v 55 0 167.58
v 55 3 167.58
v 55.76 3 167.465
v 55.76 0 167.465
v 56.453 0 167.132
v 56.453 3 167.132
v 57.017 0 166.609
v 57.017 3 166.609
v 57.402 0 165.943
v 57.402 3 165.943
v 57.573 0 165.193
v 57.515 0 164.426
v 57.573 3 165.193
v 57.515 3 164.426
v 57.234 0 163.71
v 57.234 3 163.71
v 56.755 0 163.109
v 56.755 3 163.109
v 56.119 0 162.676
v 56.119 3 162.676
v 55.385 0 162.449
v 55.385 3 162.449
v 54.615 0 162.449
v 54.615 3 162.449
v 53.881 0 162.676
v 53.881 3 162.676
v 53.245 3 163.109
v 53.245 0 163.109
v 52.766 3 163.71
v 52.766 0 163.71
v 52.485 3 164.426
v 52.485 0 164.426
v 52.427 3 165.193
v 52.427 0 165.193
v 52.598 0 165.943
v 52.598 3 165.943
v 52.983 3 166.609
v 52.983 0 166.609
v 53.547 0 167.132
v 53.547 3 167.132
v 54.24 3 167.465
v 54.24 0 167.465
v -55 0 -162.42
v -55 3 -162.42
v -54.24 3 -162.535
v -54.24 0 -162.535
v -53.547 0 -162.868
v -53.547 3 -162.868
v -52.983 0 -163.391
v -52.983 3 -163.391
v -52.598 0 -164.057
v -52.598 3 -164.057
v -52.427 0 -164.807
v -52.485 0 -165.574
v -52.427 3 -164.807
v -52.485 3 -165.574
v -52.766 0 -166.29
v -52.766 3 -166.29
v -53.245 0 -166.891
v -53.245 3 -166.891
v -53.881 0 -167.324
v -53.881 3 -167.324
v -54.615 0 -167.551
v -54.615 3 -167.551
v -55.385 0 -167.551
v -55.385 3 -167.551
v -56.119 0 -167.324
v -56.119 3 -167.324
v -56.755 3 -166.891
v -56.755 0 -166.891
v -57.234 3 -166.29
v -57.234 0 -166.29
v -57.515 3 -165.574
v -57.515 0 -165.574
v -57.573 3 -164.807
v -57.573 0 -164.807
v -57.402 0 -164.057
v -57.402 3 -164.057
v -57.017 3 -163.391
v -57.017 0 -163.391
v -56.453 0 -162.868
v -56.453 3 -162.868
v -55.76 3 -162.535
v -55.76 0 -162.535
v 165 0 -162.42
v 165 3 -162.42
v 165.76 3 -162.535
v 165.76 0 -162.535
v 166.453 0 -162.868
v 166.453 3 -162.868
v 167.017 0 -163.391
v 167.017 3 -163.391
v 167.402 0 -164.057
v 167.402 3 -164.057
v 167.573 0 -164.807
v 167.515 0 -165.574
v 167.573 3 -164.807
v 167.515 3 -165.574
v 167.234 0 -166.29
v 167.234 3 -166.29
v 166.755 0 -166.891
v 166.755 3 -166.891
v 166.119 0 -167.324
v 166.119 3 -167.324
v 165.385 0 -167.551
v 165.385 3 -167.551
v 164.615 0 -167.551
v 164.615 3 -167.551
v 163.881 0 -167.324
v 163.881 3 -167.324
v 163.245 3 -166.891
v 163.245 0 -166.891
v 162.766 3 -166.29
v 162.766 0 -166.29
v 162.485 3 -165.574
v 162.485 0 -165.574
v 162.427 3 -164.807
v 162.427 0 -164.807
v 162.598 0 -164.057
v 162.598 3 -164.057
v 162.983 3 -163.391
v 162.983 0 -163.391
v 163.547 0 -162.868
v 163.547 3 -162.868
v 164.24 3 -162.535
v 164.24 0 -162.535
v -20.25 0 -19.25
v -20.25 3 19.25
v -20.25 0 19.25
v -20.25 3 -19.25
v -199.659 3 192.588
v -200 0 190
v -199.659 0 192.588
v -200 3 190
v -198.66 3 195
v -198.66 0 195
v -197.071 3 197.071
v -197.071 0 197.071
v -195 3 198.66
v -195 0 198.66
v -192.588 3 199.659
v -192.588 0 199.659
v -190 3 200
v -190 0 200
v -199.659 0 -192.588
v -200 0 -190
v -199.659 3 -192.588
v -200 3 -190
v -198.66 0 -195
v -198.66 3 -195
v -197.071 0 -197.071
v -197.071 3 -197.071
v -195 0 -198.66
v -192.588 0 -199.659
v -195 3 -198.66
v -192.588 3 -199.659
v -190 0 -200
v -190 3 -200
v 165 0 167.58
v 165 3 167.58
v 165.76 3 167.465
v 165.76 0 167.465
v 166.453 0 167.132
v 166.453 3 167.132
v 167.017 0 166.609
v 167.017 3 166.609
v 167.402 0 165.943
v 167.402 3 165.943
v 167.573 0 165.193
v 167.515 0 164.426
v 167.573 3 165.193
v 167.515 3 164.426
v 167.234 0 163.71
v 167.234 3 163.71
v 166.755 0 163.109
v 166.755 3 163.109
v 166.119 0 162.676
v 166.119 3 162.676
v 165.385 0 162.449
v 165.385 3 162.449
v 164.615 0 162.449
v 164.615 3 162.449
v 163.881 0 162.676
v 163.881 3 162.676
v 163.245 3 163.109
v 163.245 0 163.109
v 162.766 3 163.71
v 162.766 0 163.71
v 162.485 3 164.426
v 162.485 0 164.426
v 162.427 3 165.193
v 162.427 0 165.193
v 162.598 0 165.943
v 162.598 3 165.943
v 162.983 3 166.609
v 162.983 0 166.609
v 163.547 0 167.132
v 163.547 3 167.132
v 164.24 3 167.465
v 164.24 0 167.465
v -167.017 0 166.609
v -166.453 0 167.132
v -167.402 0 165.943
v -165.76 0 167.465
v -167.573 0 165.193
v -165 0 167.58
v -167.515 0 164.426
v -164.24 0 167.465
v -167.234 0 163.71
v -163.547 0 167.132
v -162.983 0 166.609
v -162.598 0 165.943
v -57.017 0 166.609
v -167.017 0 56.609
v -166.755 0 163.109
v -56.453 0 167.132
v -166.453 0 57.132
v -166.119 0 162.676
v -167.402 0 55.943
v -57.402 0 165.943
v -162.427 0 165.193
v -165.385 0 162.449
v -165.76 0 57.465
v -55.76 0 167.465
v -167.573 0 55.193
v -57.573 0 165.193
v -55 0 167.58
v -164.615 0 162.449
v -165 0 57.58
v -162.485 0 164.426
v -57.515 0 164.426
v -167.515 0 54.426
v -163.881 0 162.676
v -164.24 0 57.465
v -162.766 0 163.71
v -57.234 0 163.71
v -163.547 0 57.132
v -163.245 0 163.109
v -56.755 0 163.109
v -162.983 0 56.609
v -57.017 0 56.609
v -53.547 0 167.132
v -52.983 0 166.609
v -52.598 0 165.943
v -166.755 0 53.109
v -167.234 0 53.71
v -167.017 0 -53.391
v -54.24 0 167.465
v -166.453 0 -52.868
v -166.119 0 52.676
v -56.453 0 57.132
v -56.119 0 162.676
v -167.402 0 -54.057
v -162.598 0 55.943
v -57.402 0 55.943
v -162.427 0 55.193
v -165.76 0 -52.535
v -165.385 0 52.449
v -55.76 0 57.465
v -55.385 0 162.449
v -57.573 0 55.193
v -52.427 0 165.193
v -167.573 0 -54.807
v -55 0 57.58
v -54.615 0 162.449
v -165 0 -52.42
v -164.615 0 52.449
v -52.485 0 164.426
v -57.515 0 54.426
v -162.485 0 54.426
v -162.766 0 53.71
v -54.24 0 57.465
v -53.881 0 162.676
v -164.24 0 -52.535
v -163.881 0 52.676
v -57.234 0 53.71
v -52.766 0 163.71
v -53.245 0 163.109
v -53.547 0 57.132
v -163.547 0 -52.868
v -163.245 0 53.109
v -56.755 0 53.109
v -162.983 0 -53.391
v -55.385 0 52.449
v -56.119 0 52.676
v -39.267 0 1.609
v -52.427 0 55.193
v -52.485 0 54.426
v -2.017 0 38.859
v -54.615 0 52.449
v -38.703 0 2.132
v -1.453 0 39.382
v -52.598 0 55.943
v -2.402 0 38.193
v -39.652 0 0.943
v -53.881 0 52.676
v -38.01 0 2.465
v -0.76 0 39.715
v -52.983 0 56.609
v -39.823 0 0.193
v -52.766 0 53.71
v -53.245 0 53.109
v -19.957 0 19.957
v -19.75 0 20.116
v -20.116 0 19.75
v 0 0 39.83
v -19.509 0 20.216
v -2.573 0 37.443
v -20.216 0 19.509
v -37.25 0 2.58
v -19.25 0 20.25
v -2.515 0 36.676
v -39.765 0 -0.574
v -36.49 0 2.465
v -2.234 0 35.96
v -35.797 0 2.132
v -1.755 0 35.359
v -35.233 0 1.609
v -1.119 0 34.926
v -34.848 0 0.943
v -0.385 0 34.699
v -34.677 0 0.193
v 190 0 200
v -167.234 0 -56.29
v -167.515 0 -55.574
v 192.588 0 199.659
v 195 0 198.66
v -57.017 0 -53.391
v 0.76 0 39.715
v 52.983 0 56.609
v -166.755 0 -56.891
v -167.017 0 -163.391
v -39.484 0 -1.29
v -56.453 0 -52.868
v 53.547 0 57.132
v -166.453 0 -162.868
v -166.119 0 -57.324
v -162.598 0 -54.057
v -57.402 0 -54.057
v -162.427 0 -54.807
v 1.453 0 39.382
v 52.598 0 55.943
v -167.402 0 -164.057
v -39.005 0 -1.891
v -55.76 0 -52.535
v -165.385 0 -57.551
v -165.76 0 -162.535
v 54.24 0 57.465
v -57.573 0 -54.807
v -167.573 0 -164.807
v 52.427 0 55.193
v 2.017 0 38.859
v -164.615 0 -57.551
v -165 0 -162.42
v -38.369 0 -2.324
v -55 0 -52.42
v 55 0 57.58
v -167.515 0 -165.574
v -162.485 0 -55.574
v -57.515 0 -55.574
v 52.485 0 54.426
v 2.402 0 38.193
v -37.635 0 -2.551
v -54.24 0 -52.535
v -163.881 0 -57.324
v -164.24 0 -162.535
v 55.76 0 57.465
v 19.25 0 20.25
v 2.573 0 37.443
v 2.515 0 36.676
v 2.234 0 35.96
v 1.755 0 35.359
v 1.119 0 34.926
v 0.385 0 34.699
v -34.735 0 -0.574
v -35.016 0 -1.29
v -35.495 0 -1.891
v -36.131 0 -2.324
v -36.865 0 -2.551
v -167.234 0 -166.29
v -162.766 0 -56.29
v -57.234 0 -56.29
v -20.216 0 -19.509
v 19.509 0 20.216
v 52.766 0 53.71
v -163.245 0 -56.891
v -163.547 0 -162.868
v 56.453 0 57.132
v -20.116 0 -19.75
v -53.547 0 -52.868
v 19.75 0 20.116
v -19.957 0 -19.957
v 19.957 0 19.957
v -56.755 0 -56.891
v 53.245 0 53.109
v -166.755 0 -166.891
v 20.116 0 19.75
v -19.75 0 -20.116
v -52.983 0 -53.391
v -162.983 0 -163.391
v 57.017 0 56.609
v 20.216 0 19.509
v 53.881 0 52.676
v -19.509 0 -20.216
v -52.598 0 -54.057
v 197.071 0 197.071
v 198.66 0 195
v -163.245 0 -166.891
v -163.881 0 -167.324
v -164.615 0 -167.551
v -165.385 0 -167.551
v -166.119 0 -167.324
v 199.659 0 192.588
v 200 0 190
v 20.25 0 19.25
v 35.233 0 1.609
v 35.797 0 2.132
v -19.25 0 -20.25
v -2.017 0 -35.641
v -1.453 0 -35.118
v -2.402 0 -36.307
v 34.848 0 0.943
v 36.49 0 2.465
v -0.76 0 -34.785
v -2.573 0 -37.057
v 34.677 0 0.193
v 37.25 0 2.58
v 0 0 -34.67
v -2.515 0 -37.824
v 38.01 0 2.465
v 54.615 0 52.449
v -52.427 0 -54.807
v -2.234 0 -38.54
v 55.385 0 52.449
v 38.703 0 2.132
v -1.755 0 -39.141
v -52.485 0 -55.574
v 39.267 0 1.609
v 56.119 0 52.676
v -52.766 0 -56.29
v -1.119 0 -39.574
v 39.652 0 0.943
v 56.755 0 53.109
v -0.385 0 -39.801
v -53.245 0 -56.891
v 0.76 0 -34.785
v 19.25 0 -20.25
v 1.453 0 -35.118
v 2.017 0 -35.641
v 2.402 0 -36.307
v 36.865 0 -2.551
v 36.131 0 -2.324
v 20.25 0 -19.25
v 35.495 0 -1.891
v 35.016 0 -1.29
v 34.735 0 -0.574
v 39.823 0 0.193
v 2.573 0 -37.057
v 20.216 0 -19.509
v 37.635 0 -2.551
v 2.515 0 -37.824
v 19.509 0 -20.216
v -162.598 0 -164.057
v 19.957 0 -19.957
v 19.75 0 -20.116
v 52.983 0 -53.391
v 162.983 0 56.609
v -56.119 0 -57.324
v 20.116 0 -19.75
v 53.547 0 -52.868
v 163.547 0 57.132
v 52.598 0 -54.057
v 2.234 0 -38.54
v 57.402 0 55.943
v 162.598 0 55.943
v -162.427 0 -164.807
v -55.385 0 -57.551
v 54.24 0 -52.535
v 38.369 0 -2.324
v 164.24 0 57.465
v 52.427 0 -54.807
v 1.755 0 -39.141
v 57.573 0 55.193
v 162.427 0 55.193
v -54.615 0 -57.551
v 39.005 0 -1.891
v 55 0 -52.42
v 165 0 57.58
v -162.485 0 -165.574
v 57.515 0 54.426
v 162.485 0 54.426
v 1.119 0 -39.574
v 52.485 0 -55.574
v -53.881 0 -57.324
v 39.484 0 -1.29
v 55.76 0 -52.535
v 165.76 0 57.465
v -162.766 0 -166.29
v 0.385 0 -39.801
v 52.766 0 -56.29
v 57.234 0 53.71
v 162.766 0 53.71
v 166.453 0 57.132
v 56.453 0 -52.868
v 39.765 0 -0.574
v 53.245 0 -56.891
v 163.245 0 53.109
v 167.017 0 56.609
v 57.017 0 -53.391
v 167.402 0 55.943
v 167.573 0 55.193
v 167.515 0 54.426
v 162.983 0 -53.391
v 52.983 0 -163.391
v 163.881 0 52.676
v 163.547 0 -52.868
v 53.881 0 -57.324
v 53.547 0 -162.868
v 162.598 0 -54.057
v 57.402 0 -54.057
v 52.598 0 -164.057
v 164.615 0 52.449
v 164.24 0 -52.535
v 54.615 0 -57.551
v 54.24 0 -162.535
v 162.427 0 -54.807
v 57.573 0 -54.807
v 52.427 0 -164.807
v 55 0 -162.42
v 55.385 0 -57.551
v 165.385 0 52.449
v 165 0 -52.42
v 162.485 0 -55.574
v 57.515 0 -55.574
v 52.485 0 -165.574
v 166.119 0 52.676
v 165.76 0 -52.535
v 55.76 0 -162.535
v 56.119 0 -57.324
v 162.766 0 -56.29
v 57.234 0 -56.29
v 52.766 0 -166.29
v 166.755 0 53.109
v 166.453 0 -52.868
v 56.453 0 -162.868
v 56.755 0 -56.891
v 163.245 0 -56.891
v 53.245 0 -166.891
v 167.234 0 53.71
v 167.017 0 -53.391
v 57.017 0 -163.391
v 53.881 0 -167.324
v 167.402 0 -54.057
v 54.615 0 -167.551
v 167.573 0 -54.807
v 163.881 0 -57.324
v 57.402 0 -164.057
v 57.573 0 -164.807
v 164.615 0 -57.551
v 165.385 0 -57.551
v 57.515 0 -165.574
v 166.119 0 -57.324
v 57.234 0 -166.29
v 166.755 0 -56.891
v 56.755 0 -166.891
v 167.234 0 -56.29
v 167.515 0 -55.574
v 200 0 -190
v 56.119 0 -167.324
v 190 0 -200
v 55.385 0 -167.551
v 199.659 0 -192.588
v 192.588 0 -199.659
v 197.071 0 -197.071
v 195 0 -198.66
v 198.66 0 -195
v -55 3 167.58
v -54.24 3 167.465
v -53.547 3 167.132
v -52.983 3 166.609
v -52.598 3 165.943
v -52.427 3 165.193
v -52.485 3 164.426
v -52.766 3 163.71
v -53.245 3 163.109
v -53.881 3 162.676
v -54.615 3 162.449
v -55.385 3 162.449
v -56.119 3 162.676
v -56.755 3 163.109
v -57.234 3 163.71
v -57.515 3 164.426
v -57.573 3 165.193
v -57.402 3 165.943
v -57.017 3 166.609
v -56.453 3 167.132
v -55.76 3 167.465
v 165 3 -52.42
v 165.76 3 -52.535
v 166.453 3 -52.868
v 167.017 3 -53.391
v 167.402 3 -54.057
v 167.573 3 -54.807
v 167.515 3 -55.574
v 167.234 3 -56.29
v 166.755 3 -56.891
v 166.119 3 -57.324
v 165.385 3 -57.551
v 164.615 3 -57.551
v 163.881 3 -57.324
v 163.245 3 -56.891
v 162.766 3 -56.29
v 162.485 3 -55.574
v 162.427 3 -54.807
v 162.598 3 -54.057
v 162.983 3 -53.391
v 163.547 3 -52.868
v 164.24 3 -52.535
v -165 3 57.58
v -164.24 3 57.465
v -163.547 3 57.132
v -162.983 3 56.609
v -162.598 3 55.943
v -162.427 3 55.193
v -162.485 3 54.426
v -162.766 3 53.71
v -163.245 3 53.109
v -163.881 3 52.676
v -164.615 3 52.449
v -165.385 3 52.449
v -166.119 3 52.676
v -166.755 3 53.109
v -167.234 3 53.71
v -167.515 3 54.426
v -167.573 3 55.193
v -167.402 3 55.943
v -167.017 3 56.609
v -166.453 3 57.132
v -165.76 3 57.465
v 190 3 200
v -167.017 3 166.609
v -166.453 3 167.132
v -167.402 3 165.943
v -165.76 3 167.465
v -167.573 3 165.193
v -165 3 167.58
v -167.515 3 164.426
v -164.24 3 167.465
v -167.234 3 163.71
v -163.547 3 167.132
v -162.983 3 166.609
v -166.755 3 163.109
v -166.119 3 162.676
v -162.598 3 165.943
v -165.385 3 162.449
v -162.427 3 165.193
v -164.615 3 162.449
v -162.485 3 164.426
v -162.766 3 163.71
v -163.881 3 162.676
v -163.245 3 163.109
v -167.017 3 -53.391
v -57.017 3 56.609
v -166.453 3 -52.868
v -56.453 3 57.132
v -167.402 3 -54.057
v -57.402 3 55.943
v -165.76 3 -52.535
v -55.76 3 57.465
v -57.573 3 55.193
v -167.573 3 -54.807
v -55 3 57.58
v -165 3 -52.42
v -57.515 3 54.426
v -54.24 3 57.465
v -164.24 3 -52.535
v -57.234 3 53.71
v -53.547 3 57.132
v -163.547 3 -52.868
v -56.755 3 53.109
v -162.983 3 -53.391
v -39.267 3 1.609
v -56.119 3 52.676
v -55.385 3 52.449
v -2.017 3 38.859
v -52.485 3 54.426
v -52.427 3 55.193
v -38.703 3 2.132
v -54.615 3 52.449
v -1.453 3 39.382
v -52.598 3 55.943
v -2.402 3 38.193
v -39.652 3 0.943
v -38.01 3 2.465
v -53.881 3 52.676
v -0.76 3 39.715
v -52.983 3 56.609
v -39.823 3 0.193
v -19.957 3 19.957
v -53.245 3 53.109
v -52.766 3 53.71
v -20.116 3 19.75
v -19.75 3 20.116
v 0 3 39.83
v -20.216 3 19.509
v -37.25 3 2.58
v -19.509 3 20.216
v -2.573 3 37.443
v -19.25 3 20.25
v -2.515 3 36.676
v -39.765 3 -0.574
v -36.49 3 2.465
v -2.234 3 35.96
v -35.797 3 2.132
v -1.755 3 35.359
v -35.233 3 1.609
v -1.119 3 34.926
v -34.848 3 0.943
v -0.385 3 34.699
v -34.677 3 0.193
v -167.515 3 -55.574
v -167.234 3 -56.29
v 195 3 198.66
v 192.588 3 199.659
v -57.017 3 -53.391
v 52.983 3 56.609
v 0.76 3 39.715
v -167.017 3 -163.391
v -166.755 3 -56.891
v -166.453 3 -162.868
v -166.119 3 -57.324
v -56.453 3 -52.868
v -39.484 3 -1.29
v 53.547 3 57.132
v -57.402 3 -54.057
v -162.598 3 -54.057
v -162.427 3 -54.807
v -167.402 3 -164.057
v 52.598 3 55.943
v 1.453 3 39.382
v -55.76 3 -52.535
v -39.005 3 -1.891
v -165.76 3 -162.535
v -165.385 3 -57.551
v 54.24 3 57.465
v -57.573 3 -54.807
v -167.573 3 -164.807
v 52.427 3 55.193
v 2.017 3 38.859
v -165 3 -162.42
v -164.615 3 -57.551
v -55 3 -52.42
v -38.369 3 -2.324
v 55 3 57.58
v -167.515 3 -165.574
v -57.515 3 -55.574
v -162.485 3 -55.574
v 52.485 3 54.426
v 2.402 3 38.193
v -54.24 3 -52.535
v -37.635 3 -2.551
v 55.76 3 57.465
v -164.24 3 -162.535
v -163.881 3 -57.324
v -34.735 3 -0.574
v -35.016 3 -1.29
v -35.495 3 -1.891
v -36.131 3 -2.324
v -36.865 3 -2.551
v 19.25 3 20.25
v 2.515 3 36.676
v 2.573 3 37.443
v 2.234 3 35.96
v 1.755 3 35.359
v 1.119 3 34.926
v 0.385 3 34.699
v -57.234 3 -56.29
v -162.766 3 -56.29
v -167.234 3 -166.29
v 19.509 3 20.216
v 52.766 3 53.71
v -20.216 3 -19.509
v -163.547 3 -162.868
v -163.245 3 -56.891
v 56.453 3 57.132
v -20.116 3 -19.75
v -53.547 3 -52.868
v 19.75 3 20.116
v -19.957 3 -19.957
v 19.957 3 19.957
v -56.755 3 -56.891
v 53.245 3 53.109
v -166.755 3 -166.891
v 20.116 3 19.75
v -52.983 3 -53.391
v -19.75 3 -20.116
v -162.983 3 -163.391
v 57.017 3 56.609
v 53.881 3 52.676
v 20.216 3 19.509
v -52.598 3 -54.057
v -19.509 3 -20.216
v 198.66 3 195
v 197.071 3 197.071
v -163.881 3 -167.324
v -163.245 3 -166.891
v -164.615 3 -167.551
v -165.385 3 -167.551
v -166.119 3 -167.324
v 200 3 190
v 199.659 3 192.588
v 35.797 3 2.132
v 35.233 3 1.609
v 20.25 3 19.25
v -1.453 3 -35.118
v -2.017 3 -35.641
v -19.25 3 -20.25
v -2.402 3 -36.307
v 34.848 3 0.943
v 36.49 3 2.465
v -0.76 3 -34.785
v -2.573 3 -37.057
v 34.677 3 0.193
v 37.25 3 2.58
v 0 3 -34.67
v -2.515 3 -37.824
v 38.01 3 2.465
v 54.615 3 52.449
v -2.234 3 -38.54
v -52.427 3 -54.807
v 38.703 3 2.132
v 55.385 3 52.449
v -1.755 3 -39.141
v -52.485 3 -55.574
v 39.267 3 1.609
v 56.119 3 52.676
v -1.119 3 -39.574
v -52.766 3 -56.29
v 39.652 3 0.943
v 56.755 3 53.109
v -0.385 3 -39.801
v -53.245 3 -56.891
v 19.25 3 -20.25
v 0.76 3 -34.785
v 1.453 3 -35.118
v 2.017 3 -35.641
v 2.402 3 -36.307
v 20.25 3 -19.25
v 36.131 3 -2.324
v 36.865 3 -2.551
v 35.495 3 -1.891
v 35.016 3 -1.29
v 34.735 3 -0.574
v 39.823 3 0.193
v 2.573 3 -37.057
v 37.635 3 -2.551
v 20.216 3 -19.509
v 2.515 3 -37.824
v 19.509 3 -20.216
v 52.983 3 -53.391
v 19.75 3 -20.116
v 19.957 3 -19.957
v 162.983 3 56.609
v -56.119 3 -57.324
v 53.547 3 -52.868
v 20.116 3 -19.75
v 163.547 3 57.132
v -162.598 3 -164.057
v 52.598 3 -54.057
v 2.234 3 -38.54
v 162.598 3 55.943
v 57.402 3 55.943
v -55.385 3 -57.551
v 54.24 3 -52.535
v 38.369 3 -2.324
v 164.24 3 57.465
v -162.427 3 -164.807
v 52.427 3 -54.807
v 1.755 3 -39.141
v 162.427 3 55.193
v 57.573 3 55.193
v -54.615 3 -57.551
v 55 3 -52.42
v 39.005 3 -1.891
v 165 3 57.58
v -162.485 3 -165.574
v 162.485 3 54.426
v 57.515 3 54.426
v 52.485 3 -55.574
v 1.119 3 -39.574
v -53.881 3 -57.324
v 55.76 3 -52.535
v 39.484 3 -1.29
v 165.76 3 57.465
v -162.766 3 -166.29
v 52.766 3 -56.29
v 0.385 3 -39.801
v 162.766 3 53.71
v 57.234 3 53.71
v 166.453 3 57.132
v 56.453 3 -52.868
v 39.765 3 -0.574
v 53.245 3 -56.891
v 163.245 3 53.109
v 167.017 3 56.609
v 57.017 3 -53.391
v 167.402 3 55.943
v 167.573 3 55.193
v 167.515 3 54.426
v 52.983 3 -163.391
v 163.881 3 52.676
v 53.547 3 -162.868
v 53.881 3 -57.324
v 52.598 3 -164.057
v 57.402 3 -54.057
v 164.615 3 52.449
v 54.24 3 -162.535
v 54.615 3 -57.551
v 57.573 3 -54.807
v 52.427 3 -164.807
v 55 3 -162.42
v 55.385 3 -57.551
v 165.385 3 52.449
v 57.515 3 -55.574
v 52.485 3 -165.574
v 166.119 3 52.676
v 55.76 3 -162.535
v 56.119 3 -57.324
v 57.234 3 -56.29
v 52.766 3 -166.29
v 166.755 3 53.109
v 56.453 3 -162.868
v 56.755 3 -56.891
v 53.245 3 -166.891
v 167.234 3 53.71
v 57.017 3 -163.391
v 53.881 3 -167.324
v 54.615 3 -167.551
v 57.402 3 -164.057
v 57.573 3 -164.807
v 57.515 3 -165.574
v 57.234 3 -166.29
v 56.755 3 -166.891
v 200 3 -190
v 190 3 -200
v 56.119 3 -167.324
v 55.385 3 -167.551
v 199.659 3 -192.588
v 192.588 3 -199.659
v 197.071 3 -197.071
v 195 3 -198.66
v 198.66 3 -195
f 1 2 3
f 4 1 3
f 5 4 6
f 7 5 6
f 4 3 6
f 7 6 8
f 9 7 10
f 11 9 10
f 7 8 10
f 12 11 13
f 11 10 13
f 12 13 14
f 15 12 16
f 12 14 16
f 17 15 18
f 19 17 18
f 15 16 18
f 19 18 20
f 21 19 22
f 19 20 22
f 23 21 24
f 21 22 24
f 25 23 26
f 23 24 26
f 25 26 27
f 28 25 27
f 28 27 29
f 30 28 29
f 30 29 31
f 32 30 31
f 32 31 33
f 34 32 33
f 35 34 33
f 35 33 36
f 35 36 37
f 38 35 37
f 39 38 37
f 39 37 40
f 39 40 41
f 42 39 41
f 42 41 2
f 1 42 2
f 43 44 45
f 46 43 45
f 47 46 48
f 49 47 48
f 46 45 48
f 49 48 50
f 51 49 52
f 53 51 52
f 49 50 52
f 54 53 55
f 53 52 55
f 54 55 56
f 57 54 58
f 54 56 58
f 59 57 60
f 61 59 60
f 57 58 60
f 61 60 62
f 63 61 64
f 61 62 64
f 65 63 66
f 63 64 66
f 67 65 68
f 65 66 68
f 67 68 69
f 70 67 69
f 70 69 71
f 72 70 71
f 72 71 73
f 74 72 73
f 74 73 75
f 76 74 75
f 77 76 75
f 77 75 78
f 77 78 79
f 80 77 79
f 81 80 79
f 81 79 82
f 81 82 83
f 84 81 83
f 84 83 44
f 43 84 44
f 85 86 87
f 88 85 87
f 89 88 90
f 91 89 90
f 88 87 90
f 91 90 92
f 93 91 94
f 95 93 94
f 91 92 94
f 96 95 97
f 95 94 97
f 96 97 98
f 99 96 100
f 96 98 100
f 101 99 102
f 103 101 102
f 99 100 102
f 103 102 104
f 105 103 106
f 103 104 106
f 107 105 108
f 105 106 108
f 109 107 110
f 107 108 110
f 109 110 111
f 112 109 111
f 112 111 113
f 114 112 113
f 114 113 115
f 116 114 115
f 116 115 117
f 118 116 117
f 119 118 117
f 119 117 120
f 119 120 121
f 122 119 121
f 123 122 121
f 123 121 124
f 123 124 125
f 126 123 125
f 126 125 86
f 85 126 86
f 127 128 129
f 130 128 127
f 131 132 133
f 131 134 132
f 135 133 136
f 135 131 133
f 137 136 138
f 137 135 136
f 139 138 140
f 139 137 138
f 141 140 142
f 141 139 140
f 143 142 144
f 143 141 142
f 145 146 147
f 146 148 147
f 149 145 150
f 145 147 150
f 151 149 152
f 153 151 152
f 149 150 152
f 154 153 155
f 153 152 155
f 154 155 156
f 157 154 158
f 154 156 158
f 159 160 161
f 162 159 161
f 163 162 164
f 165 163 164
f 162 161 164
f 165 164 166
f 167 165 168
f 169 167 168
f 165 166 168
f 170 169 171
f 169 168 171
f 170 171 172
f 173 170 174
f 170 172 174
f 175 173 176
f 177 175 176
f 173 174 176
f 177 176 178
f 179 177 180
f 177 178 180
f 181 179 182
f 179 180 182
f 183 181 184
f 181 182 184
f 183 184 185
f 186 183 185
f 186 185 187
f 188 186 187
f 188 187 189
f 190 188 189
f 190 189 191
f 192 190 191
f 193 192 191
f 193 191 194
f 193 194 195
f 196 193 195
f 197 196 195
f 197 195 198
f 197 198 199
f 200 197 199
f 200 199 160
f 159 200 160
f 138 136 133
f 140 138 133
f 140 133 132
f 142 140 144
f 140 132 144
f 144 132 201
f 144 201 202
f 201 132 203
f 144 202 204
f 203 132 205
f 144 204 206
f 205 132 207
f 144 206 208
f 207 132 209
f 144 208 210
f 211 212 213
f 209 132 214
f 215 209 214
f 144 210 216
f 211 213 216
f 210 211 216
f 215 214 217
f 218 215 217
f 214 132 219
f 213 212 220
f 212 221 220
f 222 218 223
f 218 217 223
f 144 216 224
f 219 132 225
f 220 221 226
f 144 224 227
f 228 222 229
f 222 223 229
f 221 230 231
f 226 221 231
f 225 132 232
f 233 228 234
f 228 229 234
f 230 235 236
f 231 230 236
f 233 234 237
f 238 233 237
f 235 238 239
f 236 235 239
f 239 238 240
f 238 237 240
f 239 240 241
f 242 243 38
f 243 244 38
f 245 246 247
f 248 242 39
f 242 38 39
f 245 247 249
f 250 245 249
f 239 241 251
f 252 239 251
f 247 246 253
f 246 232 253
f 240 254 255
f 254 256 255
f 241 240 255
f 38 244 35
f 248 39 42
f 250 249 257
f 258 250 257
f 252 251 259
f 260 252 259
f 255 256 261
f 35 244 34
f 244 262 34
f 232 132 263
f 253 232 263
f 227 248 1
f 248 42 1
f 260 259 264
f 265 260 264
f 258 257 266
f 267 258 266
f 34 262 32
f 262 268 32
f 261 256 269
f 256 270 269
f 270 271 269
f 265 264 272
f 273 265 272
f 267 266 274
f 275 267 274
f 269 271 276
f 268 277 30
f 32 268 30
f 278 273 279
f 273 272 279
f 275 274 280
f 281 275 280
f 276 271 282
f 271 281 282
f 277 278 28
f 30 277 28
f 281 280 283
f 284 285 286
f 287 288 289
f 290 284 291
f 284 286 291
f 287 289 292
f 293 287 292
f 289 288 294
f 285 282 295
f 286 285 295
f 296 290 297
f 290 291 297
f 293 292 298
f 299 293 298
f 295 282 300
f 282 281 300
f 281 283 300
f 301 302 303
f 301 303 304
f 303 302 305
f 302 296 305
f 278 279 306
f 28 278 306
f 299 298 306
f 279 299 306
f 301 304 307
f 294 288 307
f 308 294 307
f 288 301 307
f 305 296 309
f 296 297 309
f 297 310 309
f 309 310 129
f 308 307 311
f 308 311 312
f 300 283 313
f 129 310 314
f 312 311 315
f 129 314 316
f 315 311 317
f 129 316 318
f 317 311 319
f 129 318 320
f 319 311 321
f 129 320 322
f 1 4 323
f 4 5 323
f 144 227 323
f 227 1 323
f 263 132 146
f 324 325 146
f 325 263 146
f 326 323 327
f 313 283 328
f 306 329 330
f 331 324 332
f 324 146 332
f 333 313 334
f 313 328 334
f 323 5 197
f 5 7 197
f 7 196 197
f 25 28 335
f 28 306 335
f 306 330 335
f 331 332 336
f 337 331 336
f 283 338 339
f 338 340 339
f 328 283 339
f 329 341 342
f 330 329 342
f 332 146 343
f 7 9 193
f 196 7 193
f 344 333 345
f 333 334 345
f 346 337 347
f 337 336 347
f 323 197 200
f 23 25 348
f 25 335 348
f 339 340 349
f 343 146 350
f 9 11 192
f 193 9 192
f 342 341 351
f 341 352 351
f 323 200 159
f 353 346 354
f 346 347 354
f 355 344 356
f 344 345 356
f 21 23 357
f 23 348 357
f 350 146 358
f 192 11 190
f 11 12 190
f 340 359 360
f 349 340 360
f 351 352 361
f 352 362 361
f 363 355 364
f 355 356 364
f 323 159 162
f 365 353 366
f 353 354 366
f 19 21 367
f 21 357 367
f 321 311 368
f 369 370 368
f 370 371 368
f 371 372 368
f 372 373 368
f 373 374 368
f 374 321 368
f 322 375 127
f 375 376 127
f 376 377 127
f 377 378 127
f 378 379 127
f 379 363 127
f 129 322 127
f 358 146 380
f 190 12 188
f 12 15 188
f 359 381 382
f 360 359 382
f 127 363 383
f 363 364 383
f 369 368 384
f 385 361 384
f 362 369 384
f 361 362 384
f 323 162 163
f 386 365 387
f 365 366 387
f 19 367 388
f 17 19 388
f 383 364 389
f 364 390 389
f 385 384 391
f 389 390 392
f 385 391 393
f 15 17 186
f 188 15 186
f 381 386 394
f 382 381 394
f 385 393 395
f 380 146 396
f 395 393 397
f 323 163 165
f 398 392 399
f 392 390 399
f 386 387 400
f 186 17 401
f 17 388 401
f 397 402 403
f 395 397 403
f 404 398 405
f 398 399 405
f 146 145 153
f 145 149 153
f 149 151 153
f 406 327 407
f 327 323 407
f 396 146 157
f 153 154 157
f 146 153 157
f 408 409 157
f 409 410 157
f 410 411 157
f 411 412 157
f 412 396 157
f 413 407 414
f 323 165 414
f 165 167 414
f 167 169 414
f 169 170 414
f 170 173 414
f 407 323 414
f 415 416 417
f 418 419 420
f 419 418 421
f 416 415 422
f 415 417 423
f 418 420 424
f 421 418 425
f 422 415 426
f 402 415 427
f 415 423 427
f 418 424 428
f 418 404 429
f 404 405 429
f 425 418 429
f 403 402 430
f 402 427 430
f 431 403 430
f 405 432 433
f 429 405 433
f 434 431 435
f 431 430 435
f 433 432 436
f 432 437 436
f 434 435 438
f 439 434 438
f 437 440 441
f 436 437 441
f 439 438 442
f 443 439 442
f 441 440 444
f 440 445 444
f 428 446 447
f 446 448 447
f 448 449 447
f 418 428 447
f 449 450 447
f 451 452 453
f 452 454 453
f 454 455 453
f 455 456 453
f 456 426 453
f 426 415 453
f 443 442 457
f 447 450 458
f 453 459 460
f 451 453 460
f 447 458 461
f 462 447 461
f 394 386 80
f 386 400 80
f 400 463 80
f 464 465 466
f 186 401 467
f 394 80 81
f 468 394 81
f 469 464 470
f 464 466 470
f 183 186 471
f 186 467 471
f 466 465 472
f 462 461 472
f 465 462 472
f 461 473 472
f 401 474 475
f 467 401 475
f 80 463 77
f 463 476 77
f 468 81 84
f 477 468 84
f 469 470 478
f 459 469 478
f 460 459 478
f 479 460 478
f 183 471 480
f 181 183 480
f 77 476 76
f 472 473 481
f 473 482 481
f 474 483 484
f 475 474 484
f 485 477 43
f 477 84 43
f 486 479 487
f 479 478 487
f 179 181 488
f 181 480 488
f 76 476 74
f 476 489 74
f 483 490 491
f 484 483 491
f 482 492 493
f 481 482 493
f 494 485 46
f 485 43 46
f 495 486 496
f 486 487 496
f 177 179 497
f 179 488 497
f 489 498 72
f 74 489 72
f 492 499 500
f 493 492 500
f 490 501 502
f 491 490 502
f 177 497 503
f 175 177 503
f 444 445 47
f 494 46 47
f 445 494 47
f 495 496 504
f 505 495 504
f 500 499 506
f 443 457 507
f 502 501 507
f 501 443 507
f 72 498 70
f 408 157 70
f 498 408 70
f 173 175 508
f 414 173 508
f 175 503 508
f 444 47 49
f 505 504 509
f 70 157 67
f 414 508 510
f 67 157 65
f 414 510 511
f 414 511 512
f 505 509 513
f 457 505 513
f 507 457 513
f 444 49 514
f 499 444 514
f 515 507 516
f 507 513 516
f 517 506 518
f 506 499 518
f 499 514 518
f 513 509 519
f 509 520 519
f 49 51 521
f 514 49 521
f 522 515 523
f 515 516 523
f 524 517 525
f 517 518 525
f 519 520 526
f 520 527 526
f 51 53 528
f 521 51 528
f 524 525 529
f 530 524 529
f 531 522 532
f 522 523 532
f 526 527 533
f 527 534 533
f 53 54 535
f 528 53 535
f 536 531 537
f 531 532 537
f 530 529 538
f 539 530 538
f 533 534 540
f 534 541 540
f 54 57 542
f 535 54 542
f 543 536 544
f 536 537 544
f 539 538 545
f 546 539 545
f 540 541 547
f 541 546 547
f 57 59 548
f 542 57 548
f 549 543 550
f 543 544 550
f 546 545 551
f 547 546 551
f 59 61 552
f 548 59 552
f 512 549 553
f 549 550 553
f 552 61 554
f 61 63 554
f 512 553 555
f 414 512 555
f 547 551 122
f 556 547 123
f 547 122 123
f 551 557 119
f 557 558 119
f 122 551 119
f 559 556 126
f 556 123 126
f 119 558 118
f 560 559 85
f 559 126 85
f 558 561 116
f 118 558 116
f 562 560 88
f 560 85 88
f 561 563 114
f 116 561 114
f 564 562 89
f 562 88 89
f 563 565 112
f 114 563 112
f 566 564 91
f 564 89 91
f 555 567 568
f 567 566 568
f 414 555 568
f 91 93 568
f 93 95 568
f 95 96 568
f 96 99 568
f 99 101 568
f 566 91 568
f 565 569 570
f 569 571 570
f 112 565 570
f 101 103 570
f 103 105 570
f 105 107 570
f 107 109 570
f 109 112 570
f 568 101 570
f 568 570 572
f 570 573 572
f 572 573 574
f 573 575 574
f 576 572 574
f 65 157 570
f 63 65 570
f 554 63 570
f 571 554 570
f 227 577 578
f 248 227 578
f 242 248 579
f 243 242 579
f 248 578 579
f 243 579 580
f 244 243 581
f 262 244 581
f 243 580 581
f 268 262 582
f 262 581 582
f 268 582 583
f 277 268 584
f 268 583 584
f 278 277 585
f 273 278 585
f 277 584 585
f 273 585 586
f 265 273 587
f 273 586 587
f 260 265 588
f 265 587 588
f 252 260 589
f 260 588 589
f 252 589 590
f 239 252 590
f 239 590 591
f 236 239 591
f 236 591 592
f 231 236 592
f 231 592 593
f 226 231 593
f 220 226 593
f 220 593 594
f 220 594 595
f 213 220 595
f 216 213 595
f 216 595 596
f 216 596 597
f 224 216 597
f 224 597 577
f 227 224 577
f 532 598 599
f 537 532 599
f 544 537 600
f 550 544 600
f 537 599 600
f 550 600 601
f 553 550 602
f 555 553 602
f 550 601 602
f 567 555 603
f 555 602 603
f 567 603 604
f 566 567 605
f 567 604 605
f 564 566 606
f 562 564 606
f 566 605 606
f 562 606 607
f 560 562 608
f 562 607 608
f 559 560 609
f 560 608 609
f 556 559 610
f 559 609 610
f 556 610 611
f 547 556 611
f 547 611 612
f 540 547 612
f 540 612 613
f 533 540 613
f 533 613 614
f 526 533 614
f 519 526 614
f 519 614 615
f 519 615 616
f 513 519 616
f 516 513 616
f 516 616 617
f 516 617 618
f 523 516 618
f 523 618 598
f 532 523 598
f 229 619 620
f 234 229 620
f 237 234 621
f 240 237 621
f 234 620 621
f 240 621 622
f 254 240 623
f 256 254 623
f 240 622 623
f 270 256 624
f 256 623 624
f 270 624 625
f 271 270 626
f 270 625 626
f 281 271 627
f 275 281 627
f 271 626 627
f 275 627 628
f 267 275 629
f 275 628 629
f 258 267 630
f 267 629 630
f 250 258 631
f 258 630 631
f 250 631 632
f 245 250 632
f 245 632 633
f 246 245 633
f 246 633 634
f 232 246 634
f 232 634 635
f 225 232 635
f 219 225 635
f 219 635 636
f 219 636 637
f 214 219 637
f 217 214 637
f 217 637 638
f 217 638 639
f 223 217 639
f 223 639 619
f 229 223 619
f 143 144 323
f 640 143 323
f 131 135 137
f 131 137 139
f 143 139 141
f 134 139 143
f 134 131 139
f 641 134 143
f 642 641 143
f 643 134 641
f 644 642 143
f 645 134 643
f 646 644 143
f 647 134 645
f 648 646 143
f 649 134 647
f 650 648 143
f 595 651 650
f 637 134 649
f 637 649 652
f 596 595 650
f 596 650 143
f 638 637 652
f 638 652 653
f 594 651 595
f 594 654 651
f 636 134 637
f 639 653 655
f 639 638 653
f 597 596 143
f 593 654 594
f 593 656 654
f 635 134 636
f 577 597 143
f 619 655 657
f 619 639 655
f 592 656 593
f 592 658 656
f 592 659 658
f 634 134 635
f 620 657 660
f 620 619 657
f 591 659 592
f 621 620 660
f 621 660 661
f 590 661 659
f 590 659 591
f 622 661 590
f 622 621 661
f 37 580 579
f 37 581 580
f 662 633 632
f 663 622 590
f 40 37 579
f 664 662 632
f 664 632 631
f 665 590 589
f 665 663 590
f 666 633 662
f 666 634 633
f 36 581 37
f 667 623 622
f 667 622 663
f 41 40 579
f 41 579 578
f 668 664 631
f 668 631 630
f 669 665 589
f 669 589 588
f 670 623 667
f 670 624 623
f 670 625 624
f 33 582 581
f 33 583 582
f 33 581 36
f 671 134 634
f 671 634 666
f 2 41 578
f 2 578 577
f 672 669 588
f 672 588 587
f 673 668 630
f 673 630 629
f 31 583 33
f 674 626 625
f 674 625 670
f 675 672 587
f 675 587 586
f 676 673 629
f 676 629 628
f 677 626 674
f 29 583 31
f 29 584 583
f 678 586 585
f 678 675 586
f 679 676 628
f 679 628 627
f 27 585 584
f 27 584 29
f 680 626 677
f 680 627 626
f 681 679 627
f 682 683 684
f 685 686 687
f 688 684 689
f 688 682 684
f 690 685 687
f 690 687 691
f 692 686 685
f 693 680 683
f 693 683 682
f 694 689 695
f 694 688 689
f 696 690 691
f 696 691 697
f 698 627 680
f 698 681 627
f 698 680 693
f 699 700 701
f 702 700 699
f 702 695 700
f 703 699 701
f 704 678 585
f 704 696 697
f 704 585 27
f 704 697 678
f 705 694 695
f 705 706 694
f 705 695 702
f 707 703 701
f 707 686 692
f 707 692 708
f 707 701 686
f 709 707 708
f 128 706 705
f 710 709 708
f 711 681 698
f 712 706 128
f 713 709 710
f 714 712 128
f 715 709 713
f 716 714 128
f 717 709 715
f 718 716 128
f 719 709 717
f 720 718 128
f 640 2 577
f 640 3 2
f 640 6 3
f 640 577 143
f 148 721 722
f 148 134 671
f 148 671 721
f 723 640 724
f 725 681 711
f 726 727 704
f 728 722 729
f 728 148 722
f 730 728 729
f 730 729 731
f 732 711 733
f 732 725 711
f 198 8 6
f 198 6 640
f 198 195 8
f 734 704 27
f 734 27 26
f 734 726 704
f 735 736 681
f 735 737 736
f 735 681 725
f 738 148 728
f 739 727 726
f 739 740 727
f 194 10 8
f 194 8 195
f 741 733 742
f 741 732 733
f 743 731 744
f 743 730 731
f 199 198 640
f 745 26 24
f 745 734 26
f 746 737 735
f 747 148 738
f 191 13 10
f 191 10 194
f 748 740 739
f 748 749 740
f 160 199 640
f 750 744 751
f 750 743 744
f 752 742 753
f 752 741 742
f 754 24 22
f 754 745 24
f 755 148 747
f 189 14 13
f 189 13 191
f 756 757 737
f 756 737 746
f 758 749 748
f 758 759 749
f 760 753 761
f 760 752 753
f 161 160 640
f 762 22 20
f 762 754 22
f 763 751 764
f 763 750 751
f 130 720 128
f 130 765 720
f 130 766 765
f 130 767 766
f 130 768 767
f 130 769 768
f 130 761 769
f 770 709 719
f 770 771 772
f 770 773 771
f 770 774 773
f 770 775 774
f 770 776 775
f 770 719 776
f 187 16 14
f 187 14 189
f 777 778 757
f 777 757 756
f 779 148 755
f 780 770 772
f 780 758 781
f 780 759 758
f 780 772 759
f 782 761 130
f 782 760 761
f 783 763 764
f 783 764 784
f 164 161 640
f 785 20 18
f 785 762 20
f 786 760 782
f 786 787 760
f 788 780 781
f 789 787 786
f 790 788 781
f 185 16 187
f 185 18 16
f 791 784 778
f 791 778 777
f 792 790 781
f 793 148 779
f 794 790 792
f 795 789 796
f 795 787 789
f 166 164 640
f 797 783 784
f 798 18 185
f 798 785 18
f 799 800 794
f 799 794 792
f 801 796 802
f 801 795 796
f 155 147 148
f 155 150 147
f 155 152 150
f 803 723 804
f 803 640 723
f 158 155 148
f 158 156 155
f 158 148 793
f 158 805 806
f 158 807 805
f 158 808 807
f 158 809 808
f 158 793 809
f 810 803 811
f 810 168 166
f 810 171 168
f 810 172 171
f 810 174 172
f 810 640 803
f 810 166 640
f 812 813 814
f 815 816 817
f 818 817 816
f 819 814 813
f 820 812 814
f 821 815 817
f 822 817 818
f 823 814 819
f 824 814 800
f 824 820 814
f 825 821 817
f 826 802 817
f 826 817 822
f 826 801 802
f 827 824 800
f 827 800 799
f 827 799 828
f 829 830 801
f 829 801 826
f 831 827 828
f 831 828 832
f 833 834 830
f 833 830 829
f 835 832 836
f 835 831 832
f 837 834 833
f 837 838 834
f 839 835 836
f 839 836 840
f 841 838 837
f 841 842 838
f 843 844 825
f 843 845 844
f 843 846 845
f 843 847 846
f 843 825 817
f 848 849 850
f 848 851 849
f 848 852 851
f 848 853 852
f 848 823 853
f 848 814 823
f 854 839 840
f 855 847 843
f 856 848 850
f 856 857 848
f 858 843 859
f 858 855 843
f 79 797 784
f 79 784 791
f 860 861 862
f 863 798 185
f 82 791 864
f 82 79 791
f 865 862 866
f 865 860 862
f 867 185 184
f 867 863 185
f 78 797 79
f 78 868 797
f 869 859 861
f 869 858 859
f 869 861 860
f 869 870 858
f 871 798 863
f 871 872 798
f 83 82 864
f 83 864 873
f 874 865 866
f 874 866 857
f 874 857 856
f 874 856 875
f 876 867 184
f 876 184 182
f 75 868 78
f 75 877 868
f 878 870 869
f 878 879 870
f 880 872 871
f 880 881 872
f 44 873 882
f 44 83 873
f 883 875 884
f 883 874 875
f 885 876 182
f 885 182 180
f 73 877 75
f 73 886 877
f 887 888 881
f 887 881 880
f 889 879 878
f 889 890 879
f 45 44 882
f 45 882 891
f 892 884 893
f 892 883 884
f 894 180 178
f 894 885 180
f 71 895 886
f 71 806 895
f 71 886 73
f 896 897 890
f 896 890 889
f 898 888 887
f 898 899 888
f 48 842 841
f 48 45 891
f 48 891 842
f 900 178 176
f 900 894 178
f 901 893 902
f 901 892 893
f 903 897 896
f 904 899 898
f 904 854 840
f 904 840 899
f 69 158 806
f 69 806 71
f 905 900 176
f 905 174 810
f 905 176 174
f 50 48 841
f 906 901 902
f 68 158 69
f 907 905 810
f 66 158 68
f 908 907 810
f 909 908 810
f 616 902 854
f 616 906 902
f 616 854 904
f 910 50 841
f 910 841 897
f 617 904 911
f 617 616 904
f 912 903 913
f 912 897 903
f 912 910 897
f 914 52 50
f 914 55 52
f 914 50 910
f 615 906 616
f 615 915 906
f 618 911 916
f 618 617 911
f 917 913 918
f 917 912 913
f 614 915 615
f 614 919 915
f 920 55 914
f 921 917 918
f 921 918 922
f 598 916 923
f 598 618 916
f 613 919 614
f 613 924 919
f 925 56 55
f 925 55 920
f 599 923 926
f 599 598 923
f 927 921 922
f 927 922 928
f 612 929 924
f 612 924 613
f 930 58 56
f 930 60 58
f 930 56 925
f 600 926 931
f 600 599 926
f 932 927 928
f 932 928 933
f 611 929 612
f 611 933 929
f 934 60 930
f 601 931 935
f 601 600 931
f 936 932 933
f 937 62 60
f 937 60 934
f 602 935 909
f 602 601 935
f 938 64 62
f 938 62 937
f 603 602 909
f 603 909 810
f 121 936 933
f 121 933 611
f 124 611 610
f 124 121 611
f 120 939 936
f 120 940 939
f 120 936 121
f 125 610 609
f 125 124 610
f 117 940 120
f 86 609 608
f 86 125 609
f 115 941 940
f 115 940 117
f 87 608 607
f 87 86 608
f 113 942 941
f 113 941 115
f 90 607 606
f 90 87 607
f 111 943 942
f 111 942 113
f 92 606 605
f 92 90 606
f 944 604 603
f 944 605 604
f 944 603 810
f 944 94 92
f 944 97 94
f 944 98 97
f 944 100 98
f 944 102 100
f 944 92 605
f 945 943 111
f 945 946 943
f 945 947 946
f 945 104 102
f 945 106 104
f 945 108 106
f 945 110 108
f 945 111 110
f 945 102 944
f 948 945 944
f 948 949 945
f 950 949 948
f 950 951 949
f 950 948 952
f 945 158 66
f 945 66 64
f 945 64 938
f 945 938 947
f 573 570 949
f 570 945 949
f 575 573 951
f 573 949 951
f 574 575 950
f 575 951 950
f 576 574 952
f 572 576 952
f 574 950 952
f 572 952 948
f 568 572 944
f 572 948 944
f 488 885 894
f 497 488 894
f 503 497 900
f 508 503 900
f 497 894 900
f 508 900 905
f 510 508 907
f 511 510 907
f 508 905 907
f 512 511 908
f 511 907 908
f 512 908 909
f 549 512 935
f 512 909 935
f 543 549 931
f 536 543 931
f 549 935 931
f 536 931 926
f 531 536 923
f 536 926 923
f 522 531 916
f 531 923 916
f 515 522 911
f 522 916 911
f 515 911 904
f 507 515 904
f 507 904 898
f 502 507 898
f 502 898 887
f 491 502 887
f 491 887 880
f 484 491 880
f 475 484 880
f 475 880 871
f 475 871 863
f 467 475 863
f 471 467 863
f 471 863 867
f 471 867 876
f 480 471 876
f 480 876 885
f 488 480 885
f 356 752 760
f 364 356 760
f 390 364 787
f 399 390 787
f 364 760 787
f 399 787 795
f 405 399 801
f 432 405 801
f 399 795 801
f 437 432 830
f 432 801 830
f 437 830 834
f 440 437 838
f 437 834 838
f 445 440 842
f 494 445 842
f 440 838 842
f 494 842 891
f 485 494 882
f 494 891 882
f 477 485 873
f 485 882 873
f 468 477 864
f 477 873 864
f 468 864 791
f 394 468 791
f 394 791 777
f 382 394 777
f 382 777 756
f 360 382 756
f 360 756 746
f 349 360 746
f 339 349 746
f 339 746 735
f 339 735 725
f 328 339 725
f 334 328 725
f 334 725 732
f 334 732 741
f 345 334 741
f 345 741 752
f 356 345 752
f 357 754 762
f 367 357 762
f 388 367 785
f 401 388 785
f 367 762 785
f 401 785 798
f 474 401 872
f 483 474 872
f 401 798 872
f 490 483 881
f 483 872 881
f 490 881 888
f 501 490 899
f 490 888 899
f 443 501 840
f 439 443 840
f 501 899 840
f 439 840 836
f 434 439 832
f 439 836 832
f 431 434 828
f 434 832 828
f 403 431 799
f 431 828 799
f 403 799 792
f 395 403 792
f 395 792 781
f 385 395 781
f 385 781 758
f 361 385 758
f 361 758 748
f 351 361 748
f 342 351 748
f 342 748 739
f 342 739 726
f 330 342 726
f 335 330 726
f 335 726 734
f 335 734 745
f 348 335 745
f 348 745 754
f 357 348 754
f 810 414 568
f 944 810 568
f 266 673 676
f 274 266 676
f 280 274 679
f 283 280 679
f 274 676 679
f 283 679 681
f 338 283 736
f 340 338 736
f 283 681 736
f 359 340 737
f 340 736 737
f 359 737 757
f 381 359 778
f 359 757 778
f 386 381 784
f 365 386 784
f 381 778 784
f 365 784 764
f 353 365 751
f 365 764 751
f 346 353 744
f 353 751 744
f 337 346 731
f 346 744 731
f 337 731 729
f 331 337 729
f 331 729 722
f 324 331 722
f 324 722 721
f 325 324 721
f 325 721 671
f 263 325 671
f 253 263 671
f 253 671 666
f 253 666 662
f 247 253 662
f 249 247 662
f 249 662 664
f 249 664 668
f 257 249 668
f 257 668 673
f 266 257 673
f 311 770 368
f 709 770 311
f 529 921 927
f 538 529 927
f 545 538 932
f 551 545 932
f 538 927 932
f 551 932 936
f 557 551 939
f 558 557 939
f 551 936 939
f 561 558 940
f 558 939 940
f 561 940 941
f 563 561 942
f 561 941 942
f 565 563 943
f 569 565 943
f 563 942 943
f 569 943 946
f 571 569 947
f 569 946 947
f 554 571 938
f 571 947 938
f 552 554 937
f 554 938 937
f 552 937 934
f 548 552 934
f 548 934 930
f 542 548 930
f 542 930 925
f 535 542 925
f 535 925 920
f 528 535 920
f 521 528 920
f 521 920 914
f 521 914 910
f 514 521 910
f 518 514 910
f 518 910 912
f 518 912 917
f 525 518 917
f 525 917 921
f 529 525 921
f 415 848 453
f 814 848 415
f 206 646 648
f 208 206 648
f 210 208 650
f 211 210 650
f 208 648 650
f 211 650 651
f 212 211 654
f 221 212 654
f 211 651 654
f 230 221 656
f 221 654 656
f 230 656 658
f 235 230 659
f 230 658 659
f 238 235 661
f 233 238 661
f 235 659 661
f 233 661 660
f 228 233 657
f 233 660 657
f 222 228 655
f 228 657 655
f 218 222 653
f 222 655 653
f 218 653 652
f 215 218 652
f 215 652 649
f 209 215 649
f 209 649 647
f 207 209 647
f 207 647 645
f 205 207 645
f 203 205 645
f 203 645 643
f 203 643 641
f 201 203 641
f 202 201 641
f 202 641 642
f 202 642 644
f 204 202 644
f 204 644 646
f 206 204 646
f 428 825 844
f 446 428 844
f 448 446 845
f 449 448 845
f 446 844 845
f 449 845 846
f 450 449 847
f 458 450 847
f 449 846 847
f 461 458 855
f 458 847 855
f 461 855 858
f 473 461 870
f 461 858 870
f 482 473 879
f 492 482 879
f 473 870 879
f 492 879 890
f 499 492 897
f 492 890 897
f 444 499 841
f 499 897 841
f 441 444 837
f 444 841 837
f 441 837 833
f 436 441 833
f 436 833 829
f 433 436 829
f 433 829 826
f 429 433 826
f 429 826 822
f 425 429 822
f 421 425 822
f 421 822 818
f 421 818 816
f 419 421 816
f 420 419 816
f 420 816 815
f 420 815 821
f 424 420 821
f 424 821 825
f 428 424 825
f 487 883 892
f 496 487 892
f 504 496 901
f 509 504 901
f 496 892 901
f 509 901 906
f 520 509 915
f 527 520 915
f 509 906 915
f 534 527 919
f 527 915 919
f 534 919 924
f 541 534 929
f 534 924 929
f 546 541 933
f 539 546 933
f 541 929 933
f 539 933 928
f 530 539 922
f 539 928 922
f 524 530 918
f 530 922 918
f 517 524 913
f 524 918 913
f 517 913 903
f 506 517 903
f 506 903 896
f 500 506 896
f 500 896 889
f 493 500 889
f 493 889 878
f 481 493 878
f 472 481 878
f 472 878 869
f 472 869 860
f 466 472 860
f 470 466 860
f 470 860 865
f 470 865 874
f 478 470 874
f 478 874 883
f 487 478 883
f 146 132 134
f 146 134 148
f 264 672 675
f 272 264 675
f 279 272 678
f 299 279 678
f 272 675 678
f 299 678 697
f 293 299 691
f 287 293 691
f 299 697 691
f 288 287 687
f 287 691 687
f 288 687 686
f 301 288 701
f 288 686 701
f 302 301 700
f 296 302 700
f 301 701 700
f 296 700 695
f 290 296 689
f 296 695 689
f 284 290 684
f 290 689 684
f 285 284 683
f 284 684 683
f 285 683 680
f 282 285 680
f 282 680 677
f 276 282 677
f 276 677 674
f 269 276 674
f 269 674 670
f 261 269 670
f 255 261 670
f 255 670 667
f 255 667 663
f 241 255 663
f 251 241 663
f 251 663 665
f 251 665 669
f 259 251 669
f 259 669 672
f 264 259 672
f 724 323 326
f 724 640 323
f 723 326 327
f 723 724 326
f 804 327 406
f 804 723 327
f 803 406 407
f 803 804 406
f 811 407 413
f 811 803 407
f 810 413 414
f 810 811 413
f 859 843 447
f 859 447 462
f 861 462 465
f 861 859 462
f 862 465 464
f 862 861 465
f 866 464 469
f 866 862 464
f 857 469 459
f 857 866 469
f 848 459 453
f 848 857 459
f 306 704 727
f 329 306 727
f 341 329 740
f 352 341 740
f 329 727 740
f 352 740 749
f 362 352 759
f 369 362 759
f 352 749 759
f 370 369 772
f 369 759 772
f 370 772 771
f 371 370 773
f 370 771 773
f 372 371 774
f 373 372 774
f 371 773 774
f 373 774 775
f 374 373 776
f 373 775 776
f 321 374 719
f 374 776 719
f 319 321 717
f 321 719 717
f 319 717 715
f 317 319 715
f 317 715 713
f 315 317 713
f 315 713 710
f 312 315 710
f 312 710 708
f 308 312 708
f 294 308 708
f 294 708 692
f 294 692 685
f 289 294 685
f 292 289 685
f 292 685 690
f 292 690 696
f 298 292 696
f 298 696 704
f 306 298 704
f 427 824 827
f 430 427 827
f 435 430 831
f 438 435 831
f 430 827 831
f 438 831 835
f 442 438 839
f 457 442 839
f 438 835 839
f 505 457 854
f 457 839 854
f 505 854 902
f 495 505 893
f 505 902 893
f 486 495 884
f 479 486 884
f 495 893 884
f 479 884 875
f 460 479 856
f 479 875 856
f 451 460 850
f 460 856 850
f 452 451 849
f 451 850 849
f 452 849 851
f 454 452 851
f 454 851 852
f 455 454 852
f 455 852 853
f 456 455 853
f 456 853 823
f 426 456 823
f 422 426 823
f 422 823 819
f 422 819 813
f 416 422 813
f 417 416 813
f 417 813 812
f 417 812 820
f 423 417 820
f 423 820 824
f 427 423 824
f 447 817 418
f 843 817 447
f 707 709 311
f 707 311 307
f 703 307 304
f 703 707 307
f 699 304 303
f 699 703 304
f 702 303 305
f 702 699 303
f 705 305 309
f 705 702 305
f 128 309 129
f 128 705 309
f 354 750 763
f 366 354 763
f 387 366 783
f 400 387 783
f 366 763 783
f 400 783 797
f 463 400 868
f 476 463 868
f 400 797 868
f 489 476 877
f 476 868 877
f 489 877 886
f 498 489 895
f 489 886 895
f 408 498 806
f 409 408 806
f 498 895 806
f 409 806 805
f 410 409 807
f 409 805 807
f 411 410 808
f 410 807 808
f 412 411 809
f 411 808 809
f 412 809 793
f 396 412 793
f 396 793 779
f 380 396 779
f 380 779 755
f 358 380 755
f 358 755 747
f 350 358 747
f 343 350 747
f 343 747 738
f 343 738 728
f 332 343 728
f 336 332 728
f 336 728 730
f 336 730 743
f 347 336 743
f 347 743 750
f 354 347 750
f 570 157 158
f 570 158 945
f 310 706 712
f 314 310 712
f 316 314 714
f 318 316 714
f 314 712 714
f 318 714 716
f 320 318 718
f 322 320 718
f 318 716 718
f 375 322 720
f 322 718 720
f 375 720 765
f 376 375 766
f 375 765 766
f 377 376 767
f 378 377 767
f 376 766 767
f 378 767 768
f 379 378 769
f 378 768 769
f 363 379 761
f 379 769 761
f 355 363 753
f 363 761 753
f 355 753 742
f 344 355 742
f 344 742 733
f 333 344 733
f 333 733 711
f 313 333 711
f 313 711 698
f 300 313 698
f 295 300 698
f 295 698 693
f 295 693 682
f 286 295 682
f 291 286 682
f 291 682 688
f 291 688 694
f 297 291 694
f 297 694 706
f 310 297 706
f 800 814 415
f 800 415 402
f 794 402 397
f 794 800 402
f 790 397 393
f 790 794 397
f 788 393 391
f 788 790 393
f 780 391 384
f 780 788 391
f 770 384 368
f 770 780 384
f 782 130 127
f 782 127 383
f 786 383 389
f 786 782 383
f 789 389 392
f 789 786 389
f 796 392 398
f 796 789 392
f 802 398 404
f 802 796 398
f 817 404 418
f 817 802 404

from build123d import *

# Parameters (mm, degrees)
SKETCH1_W           = 400
SKETCH1_H           = 400
BOSS_EXTRUDE1_DEPTH = 3
CUT_EXTRUDE1_DEPTH  = 283.85862193
SKETCH4_R           = 2.58
CUT_EXTRUDE2_DEPTH  = 283.85862193
SKETCH9_R           = 2.58
CUT_EXTRUDE4_DEPTH  = 283.85862193
FILLET1_R           = 10


with BuildPart() as part:
    # Sketch1 → Boss-Extrude1 (new body)
    with BuildSketch(Plane(origin=(0, 0, 0), x_dir=(1, 0, 0), z_dir=(0, 1, 0))):
        Rectangle(SKETCH1_W, SKETCH1_H)
    extrude(amount=BOSS_EXTRUDE1_DEPTH)

    # Sketch3 → Cut-Extrude1 (cut, through all)
    with BuildSketch(Plane(origin=(0, 3, 0), x_dir=(1, 0, 0), z_dir=(0, 1, 0))):
        with BuildLine():
            Line((-19.25, 20.25), (19.25, 20.25))
            ThreePointArc((19.25, 20.25), (19.957106781, 19.957106781), (20.25, 19.25))
            Line((20.25, 19.25), (20.25, -19.25))
            ThreePointArc((20.25, -19.25), (19.957106781, -19.957106781), (19.25, -20.25))
            Line((19.25, -20.25), (-19.25, -20.25))
            ThreePointArc((-19.25, -20.25), (-19.957106781, -19.957106781), (-20.25, -19.25))
            Line((-20.25, -19.25), (-20.25, 19.25))
            ThreePointArc((-20.25, 19.25), (-19.957106781, 19.957106781), (-19.25, 20.25))
        make_face()
    extrude(amount=-CUT_EXTRUDE1_DEPTH, mode=Mode.SUBTRACT)

    # Sketch4 → Cut-Extrude2 (cut, through all)
    with BuildSketch(Plane(origin=(0, 3, 0), x_dir=(1, 0, 0), z_dir=(0, 1, 0))):
        with Locations(Location((-37.25, 0, 0), (0, 0, 270))):
            Circle(SKETCH4_R)
        with Locations(Location((0, 37.25, 0), (0, 0, 270))):
            Circle(SKETCH4_R)
        with Locations(Location((37.25, 0, 0), (0, 0, 270))):
            Circle(SKETCH4_R)
        with Locations(Location((0, -37.25, 0), (0, 0, 270))):
            Circle(SKETCH4_R)
    extrude(amount=-CUT_EXTRUDE2_DEPTH, mode=Mode.SUBTRACT)

    # Sketch9 → Cut-Extrude4 (cut, through all)
    with BuildSketch(Plane(origin=(0, 3, 0), x_dir=(1, 0, 0), z_dir=(0, 1, 0))):
        with Locations(Location((-165, 165, 0), (0, 0, 270))):
            Circle(SKETCH9_R)
        with Locations(Location((-55, 165, 0), (0, 0, 270))):
            Circle(SKETCH9_R)
        with Locations(Location((55, 165, 0), (0, 0, 270))):
            Circle(SKETCH9_R)
        with Locations(Location((165, 165, 0), (0, 0, 270))):
            Circle(SKETCH9_R)
        with Locations(Location((-55, 55, 0), (0, 0, 270))):
            Circle(SKETCH9_R)
        with Locations(Location((55, 55, 0), (0, 0, 270))):
            Circle(SKETCH9_R)
        with Locations(Location((165, 55, 0), (0, 0, 270))):
            Circle(SKETCH9_R)
        with Locations(Location((-55, -55, 0), (0, 0, 270))):
            Circle(SKETCH9_R)
        with Locations(Location((55, -55, 0), (0, 0, 270))):
            Circle(SKETCH9_R)
        with Locations(Location((165, -55, 0), (0, 0, 270))):
            Circle(SKETCH9_R)
        with Locations(Location((-55, -165, 0), (0, 0, 270))):
            Circle(SKETCH9_R)
        with Locations(Location((55, -165, 0), (0, 0, 270))):
            Circle(SKETCH9_R)
        with Locations(Location((165, -165, 0), (0, 0, 270))):
            Circle(SKETCH9_R)
        with Locations(Location((-165, 55, 0), (0, 0, 270))):
            Circle(SKETCH9_R)
        with Locations(Location((-165, -55, 0), (0, 0, 270))):
            Circle(SKETCH9_R)
        with Locations(Location((-165, -165, 0), (0, 0, 270))):
            Circle(SKETCH9_R)
    extrude(amount=-CUT_EXTRUDE4_DEPTH, mode=Mode.SUBTRACT)

    # Fillet1
    fillet1_edges = [part.edges().sort_by_distance(p)[0] for p in [
        (200, 1.5, 200),
        (-200, 1.5, 200),
        (-200, 1.5, -200),
        (200, 1.5, -200),
    ]]
    fillet(fillet1_edges, radius=FILLET1_R)


solid = part.part
